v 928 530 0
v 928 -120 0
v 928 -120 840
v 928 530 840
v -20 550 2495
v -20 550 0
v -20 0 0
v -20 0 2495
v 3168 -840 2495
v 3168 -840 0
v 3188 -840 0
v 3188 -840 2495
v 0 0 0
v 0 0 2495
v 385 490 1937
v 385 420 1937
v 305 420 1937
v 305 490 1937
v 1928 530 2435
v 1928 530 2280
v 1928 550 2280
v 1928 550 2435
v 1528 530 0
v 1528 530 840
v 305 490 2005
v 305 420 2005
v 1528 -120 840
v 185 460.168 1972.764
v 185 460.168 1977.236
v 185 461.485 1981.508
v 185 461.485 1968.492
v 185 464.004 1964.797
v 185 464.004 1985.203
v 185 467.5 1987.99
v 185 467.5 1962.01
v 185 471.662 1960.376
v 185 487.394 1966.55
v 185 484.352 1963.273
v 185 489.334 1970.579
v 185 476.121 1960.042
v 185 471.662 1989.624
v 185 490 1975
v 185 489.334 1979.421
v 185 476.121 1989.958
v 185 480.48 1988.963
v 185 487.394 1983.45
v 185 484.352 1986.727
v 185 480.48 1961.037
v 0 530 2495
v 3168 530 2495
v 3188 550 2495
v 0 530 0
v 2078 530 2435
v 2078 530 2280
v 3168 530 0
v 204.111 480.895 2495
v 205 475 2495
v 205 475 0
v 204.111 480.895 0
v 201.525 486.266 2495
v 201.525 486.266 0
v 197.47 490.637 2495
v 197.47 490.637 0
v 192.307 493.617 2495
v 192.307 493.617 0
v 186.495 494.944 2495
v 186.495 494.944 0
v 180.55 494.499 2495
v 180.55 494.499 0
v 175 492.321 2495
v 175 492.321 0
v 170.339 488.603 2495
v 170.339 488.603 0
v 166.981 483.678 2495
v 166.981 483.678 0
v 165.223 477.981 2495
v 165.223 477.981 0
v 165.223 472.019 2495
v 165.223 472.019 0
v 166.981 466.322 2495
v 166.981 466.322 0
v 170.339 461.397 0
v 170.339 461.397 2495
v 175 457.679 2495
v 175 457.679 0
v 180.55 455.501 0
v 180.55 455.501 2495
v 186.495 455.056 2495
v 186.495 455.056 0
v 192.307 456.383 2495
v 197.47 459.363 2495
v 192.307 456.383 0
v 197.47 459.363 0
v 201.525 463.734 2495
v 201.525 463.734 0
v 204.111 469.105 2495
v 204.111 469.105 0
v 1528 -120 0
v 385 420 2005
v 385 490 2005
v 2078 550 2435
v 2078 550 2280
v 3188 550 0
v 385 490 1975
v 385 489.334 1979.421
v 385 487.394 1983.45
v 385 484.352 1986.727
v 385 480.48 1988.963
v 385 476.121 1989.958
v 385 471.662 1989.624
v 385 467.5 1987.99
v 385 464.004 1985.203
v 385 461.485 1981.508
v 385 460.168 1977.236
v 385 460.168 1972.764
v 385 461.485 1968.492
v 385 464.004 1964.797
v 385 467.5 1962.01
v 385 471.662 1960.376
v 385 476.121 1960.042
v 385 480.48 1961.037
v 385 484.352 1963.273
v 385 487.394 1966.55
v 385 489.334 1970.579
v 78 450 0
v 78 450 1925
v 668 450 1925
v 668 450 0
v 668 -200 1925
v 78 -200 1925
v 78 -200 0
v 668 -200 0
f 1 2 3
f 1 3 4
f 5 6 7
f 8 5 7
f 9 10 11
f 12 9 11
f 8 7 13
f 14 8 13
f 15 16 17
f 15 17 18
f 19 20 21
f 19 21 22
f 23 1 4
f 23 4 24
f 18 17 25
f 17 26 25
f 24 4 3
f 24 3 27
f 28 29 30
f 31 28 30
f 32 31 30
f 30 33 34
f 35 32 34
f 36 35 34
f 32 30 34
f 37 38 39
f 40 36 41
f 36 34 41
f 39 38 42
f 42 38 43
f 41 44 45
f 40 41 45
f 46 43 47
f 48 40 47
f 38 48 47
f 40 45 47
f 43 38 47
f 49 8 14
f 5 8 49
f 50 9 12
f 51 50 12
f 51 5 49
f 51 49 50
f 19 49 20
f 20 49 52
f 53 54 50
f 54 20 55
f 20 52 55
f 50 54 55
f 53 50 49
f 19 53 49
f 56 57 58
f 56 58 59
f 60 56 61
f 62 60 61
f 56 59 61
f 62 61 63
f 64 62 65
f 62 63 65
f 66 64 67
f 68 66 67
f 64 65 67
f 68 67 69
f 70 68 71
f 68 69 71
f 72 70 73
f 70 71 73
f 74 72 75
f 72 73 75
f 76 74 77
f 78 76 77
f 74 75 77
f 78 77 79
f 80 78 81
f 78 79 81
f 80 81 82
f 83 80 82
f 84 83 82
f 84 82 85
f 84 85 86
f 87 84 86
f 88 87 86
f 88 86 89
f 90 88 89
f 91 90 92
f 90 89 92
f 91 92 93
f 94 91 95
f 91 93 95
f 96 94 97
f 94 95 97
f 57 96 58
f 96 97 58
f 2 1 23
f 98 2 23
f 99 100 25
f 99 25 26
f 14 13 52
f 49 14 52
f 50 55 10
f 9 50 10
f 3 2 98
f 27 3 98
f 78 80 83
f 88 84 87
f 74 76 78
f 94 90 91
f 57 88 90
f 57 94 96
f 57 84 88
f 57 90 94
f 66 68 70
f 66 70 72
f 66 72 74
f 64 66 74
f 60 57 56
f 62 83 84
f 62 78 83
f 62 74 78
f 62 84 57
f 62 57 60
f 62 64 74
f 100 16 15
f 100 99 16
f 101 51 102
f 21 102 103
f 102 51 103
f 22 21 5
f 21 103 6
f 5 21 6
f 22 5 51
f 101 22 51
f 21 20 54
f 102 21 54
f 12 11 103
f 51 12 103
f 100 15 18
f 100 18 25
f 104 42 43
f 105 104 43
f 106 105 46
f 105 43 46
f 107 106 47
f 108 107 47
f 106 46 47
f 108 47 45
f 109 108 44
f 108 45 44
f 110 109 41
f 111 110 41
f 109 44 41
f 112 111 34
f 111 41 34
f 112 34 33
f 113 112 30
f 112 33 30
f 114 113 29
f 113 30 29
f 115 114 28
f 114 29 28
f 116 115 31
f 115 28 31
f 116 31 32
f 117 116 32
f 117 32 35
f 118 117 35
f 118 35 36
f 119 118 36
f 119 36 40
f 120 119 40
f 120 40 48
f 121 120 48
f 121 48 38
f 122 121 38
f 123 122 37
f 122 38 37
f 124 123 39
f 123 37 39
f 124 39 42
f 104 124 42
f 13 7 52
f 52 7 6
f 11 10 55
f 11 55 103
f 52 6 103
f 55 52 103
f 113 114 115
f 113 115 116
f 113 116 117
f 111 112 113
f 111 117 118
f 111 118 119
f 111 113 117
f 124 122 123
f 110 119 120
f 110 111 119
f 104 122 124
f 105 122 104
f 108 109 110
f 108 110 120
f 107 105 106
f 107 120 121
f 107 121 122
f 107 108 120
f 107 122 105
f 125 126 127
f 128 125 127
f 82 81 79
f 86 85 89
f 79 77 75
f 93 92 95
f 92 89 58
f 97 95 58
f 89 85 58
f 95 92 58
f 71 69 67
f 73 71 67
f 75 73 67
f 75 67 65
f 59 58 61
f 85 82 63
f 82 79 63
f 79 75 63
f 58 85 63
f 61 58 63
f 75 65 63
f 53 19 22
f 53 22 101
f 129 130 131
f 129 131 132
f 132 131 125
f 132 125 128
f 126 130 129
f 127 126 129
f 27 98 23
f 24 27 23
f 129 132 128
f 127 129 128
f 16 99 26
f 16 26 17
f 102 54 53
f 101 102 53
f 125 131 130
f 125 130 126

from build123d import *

# Parameters (mm, degrees)
F1_DEPTH  = 2495
F2_W      = 150
F2_H      = 155
F3_DEPTH  = 25
F4_W      = 590
F4_H      = 650
F5_DEPTH  = 1925
F6_W      = 600
F6_H      = 650
F7_DEPTH  = 840
F8_R      = 20
F9_DEPTH  = 2495
F12_DEPTH = 200
F14_DEPTH = 80


with BuildPart() as f1:
    # F0 (on Top) → F1 (new body)
    with BuildSketch(Plane.XY):
        Polygon((0, 0), (0, 530), (3168, 530), (3168, -840), (3188, -840), (3188, 550), (-20, 550), (-20, 0), align=None)
    extrude(amount=F1_DEPTH)

    # F2 (on face) → F3 (cut)
    with BuildSketch(Plane.XZ.offset(-530)):
        with Locations((2003, 2357.5)):
            Rectangle(F2_W, F2_H)
    extrude(amount=-F3_DEPTH, mode=Mode.SUBTRACT)


with BuildPart() as f5:
    # F4 (on Top) → F5 (new body)
    with BuildSketch(Plane.XY):
        with Locations((373, 125)):
            Rectangle(F4_W, F4_H)
    extrude(amount=F5_DEPTH)


with BuildPart() as f7:
    # F6 (on Top) → F7 (new body)
    with BuildSketch(Plane.XY):
        with Locations((1228, 205)):
            Rectangle(F6_W, F6_H)
    extrude(amount=F7_DEPTH)


with BuildPart() as f9:
    # F8 (on Top) → F9 (new body, through all)
    with BuildSketch(Plane.XY):
        with Locations((185, 475)):
            Circle(F8_R)
    extrude(amount=F9_DEPTH)


with BuildPart() as f12:
    # F11 (on offset) → F12 (new body)
    with BuildSketch(Plane.YZ.offset(185)):
        with BuildLine():
            ThreePointArc((475, 1990), (464.3933982822, 1964.3933982822), (490, 1975))
            ThreePointArc((490, 1975), (485.6066017178, 1985.6066017178), (475, 1990))
        make_face()
    extrude(amount=F12_DEPTH)


with BuildPart() as f14:
    # F13 (on face) → F14 (new body)
    with BuildSketch(Plane.YZ.offset(385)):
        Polygon((420, 1937), (490, 1937), (490, 2005), (420, 2005), (420, 1971), align=None)
    extrude(amount=-F14_DEPTH)


solid = Compound([f1.part, f5.part, f7.part, f9.part, f12.part, f14.part])
